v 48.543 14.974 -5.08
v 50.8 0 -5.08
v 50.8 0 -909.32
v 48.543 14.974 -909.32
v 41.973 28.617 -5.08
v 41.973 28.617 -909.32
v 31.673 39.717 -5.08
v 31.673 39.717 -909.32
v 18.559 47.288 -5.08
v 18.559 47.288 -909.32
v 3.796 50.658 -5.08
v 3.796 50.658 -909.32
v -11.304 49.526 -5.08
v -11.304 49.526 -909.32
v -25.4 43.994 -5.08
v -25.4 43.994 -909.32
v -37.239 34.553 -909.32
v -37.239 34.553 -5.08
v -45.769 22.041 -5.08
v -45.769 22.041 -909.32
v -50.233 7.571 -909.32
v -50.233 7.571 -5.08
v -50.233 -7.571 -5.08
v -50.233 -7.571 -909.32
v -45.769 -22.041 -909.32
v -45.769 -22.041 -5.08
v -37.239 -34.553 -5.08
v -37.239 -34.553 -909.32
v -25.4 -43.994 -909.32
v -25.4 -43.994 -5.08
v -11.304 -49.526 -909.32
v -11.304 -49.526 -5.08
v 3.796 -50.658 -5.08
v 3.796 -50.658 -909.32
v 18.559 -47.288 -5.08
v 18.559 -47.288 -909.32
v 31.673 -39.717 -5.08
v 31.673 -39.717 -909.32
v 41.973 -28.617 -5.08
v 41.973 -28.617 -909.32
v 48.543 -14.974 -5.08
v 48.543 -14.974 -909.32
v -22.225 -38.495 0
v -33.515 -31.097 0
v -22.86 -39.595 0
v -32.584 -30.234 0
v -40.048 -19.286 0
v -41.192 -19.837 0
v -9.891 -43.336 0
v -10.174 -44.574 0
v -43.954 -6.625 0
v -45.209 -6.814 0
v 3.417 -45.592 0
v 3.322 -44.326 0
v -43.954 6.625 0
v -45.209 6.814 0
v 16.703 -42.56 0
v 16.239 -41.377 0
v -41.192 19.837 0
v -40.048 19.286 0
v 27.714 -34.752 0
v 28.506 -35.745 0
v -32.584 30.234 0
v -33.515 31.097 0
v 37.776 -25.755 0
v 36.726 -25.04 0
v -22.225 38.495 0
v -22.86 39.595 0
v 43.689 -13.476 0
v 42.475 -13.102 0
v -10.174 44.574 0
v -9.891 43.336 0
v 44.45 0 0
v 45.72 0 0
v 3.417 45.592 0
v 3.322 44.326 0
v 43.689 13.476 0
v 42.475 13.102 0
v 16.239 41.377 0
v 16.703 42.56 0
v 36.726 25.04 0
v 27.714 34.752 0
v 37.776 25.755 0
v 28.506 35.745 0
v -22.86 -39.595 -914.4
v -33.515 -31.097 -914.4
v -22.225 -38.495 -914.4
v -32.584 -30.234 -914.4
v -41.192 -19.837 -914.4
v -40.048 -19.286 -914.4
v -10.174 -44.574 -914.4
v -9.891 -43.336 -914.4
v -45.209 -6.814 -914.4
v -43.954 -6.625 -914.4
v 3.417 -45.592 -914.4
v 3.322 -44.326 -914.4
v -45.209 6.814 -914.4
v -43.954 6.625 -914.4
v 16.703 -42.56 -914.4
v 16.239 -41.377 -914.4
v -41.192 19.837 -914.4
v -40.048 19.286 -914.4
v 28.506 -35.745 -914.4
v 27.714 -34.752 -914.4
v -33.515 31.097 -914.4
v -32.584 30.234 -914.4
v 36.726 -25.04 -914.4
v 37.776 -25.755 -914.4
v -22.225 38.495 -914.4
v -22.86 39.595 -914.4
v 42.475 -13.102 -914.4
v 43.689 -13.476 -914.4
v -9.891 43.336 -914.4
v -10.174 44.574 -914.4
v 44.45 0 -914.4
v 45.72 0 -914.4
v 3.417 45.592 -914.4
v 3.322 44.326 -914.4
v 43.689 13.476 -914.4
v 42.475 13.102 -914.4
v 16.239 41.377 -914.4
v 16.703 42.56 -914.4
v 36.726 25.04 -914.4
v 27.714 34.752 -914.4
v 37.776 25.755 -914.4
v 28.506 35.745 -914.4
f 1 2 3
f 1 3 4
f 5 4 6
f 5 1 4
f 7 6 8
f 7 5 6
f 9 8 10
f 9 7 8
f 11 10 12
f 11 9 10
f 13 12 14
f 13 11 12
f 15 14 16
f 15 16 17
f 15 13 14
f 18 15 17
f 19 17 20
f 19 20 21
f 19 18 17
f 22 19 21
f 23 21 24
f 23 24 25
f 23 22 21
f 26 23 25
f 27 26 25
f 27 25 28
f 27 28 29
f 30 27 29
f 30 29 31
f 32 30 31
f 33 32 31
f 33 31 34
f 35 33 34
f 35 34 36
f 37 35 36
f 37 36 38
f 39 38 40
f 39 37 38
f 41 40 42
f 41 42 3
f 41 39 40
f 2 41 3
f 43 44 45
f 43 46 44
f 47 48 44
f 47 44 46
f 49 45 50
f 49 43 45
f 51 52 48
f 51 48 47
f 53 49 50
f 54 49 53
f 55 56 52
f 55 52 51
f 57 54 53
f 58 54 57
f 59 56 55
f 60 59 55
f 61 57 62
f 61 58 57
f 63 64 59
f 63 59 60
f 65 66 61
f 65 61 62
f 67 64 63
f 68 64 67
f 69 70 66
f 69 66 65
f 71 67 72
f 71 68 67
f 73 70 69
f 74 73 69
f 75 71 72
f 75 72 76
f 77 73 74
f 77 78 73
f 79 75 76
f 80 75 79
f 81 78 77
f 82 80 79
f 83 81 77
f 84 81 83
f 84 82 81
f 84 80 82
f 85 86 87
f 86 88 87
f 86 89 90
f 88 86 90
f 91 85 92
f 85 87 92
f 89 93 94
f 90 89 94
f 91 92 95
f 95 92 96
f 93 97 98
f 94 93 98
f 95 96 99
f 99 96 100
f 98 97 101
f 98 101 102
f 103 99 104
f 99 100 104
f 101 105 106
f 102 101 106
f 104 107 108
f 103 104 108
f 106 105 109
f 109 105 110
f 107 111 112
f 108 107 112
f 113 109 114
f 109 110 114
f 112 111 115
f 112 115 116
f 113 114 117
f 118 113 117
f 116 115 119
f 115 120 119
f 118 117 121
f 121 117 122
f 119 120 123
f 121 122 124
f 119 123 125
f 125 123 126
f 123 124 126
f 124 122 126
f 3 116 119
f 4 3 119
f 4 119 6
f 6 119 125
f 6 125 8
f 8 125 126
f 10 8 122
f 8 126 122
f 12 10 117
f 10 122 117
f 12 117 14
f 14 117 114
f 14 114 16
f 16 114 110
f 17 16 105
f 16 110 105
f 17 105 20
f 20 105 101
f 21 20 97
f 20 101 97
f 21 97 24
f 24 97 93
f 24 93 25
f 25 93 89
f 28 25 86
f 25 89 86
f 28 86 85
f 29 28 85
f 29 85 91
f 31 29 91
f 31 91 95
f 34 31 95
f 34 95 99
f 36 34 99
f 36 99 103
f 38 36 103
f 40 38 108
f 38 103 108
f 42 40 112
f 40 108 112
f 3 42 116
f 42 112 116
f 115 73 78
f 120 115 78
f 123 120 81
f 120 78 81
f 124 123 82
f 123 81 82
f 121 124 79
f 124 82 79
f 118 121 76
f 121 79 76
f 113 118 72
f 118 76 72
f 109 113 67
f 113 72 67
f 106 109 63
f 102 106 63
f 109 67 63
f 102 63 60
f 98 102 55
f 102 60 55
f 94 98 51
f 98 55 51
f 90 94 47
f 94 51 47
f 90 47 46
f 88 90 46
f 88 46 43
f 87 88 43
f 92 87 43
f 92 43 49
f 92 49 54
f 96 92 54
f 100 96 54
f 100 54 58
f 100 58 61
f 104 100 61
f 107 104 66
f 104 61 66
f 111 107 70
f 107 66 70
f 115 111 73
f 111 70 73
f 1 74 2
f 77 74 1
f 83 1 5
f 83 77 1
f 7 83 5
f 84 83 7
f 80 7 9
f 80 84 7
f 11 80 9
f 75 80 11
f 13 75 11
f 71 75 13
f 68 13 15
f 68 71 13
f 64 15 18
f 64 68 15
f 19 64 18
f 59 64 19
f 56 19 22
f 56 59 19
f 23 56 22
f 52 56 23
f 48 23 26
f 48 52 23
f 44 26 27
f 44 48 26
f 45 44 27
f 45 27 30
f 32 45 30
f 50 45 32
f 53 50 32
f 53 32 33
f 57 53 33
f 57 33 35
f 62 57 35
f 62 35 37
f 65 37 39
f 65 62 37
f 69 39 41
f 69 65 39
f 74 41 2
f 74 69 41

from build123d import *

# Parameters (mm, degrees)
F0_R     = 50.8
F0_R_2   = 44.45
F1_DEPTH = 914.4
F2_SIZE  = 5.08
F3_SIZE  = 5.08


with BuildPart() as f1:
    # F0 (on Top) → F1 (new body)
    with BuildSketch(Plane.XY):
        Circle(F0_R)
        Circle(F0_R_2, mode=Mode.SUBTRACT)
    extrude(amount=-F1_DEPTH)

    # F2
    f2_edges = [f1.edges().sort_by_distance(p)[0] for p in [
        (-50.8, 0, 0),
    ]]
    chamfer(f2_edges, length=F2_SIZE)

    # F3
    f3_edges = [f1.edges().sort_by_distance(p)[0] for p in [
        (-50.8, 0, -914.4),
    ]]
    chamfer(f3_edges, length=F3_SIZE)


solid = f1.part
